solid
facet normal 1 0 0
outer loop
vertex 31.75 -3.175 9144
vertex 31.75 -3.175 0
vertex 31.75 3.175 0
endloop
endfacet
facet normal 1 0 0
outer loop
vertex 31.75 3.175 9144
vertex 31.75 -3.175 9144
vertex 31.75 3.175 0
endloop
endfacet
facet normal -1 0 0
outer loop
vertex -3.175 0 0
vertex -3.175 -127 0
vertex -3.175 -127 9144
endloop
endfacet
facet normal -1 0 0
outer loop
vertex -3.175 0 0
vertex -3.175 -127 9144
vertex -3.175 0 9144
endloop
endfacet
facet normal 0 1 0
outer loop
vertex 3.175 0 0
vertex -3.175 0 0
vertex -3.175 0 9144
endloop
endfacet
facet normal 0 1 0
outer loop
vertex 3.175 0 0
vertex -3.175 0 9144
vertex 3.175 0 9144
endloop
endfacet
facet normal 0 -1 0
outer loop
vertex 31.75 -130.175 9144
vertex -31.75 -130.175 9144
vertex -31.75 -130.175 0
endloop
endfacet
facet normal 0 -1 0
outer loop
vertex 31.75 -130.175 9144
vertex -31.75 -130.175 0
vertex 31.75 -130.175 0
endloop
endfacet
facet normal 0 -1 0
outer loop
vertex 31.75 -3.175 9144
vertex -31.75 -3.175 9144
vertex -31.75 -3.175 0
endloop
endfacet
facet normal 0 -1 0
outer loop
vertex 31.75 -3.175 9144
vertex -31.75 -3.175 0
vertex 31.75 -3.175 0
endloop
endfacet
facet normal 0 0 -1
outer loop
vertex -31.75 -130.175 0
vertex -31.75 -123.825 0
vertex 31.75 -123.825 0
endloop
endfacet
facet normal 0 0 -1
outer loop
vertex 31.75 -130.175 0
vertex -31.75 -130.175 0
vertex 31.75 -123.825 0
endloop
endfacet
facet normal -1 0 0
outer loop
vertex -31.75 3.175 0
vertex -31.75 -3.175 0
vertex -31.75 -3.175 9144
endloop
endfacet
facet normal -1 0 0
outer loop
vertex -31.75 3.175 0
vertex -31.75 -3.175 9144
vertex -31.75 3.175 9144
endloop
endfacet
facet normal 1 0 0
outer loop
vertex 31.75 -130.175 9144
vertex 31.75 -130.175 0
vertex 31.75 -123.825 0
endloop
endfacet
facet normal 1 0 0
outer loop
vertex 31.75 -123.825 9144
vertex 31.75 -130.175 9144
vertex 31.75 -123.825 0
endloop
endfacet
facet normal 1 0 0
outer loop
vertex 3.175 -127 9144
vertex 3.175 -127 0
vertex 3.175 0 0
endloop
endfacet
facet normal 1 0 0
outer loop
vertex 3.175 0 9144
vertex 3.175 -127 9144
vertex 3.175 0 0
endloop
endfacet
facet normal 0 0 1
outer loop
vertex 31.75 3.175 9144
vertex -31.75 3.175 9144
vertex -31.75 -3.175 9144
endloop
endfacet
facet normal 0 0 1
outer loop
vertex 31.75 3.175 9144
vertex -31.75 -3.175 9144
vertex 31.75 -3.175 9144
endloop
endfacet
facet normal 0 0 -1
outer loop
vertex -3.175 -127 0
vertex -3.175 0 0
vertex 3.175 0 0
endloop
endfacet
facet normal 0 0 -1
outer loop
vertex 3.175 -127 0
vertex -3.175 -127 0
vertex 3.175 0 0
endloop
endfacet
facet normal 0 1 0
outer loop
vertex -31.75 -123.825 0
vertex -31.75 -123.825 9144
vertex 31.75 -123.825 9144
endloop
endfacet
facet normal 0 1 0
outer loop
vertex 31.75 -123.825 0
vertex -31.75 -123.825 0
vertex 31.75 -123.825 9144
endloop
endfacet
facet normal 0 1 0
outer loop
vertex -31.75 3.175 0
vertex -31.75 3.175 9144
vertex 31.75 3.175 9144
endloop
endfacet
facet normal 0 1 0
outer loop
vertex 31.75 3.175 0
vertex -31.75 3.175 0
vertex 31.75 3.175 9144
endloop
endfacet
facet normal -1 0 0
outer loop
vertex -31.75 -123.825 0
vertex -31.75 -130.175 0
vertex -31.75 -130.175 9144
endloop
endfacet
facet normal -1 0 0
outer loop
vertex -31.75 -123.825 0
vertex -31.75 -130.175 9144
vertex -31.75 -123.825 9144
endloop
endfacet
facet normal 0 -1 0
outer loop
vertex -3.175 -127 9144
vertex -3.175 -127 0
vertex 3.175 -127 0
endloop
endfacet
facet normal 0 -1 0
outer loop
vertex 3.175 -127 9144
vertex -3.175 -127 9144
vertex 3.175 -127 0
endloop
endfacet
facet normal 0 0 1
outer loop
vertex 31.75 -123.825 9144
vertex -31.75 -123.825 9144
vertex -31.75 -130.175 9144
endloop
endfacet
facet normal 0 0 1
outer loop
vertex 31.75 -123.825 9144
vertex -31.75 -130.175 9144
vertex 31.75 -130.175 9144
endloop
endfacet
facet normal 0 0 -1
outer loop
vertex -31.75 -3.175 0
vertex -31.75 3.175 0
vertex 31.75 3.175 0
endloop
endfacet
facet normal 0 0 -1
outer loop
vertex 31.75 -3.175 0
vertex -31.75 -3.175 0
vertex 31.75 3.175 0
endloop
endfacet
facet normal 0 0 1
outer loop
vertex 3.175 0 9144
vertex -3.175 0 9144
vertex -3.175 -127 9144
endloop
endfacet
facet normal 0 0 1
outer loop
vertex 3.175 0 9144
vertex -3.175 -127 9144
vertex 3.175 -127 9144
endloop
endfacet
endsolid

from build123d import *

# Parameters (mm, degrees)
SKETCH1_W             = 63.5
SKETCH1_H             = 6.35
EXTRUDE_THIN1_DEPTH   = 9144
SKETCH1_W_2           = 6.35
SKETCH1_H_2           = 127
EXTRUDE_THIN1_2_DEPTH = 9144
EXTRUDE_THIN1_3_DEPTH = 9144


with BuildPart() as part:
    # Sketch1 → Extrude-Thin1 (new body)
    with BuildSketch(Plane.XY):
        Rectangle(SKETCH1_W, SKETCH1_H)
    extrude(amount=EXTRUDE_THIN1_DEPTH)


with BuildPart() as body_2:
    # Sketch1 → Extrude-Thin1 2 (new body)
    with BuildSketch(Plane.XY):
        with Locations((0, -63.5)):
            Rectangle(SKETCH1_W_2, SKETCH1_H_2)
    extrude(amount=EXTRUDE_THIN1_2_DEPTH)


with BuildPart() as body_3:
    # Sketch1 → Extrude-Thin1 3 (new body)
    with BuildSketch(Plane.XY):
        with Locations((0, -127)):
            Rectangle(SKETCH1_W, SKETCH1_H)
    extrude(amount=EXTRUDE_THIN1_3_DEPTH)


solid = Compound([part.part, body_2.part, body_3.part])
